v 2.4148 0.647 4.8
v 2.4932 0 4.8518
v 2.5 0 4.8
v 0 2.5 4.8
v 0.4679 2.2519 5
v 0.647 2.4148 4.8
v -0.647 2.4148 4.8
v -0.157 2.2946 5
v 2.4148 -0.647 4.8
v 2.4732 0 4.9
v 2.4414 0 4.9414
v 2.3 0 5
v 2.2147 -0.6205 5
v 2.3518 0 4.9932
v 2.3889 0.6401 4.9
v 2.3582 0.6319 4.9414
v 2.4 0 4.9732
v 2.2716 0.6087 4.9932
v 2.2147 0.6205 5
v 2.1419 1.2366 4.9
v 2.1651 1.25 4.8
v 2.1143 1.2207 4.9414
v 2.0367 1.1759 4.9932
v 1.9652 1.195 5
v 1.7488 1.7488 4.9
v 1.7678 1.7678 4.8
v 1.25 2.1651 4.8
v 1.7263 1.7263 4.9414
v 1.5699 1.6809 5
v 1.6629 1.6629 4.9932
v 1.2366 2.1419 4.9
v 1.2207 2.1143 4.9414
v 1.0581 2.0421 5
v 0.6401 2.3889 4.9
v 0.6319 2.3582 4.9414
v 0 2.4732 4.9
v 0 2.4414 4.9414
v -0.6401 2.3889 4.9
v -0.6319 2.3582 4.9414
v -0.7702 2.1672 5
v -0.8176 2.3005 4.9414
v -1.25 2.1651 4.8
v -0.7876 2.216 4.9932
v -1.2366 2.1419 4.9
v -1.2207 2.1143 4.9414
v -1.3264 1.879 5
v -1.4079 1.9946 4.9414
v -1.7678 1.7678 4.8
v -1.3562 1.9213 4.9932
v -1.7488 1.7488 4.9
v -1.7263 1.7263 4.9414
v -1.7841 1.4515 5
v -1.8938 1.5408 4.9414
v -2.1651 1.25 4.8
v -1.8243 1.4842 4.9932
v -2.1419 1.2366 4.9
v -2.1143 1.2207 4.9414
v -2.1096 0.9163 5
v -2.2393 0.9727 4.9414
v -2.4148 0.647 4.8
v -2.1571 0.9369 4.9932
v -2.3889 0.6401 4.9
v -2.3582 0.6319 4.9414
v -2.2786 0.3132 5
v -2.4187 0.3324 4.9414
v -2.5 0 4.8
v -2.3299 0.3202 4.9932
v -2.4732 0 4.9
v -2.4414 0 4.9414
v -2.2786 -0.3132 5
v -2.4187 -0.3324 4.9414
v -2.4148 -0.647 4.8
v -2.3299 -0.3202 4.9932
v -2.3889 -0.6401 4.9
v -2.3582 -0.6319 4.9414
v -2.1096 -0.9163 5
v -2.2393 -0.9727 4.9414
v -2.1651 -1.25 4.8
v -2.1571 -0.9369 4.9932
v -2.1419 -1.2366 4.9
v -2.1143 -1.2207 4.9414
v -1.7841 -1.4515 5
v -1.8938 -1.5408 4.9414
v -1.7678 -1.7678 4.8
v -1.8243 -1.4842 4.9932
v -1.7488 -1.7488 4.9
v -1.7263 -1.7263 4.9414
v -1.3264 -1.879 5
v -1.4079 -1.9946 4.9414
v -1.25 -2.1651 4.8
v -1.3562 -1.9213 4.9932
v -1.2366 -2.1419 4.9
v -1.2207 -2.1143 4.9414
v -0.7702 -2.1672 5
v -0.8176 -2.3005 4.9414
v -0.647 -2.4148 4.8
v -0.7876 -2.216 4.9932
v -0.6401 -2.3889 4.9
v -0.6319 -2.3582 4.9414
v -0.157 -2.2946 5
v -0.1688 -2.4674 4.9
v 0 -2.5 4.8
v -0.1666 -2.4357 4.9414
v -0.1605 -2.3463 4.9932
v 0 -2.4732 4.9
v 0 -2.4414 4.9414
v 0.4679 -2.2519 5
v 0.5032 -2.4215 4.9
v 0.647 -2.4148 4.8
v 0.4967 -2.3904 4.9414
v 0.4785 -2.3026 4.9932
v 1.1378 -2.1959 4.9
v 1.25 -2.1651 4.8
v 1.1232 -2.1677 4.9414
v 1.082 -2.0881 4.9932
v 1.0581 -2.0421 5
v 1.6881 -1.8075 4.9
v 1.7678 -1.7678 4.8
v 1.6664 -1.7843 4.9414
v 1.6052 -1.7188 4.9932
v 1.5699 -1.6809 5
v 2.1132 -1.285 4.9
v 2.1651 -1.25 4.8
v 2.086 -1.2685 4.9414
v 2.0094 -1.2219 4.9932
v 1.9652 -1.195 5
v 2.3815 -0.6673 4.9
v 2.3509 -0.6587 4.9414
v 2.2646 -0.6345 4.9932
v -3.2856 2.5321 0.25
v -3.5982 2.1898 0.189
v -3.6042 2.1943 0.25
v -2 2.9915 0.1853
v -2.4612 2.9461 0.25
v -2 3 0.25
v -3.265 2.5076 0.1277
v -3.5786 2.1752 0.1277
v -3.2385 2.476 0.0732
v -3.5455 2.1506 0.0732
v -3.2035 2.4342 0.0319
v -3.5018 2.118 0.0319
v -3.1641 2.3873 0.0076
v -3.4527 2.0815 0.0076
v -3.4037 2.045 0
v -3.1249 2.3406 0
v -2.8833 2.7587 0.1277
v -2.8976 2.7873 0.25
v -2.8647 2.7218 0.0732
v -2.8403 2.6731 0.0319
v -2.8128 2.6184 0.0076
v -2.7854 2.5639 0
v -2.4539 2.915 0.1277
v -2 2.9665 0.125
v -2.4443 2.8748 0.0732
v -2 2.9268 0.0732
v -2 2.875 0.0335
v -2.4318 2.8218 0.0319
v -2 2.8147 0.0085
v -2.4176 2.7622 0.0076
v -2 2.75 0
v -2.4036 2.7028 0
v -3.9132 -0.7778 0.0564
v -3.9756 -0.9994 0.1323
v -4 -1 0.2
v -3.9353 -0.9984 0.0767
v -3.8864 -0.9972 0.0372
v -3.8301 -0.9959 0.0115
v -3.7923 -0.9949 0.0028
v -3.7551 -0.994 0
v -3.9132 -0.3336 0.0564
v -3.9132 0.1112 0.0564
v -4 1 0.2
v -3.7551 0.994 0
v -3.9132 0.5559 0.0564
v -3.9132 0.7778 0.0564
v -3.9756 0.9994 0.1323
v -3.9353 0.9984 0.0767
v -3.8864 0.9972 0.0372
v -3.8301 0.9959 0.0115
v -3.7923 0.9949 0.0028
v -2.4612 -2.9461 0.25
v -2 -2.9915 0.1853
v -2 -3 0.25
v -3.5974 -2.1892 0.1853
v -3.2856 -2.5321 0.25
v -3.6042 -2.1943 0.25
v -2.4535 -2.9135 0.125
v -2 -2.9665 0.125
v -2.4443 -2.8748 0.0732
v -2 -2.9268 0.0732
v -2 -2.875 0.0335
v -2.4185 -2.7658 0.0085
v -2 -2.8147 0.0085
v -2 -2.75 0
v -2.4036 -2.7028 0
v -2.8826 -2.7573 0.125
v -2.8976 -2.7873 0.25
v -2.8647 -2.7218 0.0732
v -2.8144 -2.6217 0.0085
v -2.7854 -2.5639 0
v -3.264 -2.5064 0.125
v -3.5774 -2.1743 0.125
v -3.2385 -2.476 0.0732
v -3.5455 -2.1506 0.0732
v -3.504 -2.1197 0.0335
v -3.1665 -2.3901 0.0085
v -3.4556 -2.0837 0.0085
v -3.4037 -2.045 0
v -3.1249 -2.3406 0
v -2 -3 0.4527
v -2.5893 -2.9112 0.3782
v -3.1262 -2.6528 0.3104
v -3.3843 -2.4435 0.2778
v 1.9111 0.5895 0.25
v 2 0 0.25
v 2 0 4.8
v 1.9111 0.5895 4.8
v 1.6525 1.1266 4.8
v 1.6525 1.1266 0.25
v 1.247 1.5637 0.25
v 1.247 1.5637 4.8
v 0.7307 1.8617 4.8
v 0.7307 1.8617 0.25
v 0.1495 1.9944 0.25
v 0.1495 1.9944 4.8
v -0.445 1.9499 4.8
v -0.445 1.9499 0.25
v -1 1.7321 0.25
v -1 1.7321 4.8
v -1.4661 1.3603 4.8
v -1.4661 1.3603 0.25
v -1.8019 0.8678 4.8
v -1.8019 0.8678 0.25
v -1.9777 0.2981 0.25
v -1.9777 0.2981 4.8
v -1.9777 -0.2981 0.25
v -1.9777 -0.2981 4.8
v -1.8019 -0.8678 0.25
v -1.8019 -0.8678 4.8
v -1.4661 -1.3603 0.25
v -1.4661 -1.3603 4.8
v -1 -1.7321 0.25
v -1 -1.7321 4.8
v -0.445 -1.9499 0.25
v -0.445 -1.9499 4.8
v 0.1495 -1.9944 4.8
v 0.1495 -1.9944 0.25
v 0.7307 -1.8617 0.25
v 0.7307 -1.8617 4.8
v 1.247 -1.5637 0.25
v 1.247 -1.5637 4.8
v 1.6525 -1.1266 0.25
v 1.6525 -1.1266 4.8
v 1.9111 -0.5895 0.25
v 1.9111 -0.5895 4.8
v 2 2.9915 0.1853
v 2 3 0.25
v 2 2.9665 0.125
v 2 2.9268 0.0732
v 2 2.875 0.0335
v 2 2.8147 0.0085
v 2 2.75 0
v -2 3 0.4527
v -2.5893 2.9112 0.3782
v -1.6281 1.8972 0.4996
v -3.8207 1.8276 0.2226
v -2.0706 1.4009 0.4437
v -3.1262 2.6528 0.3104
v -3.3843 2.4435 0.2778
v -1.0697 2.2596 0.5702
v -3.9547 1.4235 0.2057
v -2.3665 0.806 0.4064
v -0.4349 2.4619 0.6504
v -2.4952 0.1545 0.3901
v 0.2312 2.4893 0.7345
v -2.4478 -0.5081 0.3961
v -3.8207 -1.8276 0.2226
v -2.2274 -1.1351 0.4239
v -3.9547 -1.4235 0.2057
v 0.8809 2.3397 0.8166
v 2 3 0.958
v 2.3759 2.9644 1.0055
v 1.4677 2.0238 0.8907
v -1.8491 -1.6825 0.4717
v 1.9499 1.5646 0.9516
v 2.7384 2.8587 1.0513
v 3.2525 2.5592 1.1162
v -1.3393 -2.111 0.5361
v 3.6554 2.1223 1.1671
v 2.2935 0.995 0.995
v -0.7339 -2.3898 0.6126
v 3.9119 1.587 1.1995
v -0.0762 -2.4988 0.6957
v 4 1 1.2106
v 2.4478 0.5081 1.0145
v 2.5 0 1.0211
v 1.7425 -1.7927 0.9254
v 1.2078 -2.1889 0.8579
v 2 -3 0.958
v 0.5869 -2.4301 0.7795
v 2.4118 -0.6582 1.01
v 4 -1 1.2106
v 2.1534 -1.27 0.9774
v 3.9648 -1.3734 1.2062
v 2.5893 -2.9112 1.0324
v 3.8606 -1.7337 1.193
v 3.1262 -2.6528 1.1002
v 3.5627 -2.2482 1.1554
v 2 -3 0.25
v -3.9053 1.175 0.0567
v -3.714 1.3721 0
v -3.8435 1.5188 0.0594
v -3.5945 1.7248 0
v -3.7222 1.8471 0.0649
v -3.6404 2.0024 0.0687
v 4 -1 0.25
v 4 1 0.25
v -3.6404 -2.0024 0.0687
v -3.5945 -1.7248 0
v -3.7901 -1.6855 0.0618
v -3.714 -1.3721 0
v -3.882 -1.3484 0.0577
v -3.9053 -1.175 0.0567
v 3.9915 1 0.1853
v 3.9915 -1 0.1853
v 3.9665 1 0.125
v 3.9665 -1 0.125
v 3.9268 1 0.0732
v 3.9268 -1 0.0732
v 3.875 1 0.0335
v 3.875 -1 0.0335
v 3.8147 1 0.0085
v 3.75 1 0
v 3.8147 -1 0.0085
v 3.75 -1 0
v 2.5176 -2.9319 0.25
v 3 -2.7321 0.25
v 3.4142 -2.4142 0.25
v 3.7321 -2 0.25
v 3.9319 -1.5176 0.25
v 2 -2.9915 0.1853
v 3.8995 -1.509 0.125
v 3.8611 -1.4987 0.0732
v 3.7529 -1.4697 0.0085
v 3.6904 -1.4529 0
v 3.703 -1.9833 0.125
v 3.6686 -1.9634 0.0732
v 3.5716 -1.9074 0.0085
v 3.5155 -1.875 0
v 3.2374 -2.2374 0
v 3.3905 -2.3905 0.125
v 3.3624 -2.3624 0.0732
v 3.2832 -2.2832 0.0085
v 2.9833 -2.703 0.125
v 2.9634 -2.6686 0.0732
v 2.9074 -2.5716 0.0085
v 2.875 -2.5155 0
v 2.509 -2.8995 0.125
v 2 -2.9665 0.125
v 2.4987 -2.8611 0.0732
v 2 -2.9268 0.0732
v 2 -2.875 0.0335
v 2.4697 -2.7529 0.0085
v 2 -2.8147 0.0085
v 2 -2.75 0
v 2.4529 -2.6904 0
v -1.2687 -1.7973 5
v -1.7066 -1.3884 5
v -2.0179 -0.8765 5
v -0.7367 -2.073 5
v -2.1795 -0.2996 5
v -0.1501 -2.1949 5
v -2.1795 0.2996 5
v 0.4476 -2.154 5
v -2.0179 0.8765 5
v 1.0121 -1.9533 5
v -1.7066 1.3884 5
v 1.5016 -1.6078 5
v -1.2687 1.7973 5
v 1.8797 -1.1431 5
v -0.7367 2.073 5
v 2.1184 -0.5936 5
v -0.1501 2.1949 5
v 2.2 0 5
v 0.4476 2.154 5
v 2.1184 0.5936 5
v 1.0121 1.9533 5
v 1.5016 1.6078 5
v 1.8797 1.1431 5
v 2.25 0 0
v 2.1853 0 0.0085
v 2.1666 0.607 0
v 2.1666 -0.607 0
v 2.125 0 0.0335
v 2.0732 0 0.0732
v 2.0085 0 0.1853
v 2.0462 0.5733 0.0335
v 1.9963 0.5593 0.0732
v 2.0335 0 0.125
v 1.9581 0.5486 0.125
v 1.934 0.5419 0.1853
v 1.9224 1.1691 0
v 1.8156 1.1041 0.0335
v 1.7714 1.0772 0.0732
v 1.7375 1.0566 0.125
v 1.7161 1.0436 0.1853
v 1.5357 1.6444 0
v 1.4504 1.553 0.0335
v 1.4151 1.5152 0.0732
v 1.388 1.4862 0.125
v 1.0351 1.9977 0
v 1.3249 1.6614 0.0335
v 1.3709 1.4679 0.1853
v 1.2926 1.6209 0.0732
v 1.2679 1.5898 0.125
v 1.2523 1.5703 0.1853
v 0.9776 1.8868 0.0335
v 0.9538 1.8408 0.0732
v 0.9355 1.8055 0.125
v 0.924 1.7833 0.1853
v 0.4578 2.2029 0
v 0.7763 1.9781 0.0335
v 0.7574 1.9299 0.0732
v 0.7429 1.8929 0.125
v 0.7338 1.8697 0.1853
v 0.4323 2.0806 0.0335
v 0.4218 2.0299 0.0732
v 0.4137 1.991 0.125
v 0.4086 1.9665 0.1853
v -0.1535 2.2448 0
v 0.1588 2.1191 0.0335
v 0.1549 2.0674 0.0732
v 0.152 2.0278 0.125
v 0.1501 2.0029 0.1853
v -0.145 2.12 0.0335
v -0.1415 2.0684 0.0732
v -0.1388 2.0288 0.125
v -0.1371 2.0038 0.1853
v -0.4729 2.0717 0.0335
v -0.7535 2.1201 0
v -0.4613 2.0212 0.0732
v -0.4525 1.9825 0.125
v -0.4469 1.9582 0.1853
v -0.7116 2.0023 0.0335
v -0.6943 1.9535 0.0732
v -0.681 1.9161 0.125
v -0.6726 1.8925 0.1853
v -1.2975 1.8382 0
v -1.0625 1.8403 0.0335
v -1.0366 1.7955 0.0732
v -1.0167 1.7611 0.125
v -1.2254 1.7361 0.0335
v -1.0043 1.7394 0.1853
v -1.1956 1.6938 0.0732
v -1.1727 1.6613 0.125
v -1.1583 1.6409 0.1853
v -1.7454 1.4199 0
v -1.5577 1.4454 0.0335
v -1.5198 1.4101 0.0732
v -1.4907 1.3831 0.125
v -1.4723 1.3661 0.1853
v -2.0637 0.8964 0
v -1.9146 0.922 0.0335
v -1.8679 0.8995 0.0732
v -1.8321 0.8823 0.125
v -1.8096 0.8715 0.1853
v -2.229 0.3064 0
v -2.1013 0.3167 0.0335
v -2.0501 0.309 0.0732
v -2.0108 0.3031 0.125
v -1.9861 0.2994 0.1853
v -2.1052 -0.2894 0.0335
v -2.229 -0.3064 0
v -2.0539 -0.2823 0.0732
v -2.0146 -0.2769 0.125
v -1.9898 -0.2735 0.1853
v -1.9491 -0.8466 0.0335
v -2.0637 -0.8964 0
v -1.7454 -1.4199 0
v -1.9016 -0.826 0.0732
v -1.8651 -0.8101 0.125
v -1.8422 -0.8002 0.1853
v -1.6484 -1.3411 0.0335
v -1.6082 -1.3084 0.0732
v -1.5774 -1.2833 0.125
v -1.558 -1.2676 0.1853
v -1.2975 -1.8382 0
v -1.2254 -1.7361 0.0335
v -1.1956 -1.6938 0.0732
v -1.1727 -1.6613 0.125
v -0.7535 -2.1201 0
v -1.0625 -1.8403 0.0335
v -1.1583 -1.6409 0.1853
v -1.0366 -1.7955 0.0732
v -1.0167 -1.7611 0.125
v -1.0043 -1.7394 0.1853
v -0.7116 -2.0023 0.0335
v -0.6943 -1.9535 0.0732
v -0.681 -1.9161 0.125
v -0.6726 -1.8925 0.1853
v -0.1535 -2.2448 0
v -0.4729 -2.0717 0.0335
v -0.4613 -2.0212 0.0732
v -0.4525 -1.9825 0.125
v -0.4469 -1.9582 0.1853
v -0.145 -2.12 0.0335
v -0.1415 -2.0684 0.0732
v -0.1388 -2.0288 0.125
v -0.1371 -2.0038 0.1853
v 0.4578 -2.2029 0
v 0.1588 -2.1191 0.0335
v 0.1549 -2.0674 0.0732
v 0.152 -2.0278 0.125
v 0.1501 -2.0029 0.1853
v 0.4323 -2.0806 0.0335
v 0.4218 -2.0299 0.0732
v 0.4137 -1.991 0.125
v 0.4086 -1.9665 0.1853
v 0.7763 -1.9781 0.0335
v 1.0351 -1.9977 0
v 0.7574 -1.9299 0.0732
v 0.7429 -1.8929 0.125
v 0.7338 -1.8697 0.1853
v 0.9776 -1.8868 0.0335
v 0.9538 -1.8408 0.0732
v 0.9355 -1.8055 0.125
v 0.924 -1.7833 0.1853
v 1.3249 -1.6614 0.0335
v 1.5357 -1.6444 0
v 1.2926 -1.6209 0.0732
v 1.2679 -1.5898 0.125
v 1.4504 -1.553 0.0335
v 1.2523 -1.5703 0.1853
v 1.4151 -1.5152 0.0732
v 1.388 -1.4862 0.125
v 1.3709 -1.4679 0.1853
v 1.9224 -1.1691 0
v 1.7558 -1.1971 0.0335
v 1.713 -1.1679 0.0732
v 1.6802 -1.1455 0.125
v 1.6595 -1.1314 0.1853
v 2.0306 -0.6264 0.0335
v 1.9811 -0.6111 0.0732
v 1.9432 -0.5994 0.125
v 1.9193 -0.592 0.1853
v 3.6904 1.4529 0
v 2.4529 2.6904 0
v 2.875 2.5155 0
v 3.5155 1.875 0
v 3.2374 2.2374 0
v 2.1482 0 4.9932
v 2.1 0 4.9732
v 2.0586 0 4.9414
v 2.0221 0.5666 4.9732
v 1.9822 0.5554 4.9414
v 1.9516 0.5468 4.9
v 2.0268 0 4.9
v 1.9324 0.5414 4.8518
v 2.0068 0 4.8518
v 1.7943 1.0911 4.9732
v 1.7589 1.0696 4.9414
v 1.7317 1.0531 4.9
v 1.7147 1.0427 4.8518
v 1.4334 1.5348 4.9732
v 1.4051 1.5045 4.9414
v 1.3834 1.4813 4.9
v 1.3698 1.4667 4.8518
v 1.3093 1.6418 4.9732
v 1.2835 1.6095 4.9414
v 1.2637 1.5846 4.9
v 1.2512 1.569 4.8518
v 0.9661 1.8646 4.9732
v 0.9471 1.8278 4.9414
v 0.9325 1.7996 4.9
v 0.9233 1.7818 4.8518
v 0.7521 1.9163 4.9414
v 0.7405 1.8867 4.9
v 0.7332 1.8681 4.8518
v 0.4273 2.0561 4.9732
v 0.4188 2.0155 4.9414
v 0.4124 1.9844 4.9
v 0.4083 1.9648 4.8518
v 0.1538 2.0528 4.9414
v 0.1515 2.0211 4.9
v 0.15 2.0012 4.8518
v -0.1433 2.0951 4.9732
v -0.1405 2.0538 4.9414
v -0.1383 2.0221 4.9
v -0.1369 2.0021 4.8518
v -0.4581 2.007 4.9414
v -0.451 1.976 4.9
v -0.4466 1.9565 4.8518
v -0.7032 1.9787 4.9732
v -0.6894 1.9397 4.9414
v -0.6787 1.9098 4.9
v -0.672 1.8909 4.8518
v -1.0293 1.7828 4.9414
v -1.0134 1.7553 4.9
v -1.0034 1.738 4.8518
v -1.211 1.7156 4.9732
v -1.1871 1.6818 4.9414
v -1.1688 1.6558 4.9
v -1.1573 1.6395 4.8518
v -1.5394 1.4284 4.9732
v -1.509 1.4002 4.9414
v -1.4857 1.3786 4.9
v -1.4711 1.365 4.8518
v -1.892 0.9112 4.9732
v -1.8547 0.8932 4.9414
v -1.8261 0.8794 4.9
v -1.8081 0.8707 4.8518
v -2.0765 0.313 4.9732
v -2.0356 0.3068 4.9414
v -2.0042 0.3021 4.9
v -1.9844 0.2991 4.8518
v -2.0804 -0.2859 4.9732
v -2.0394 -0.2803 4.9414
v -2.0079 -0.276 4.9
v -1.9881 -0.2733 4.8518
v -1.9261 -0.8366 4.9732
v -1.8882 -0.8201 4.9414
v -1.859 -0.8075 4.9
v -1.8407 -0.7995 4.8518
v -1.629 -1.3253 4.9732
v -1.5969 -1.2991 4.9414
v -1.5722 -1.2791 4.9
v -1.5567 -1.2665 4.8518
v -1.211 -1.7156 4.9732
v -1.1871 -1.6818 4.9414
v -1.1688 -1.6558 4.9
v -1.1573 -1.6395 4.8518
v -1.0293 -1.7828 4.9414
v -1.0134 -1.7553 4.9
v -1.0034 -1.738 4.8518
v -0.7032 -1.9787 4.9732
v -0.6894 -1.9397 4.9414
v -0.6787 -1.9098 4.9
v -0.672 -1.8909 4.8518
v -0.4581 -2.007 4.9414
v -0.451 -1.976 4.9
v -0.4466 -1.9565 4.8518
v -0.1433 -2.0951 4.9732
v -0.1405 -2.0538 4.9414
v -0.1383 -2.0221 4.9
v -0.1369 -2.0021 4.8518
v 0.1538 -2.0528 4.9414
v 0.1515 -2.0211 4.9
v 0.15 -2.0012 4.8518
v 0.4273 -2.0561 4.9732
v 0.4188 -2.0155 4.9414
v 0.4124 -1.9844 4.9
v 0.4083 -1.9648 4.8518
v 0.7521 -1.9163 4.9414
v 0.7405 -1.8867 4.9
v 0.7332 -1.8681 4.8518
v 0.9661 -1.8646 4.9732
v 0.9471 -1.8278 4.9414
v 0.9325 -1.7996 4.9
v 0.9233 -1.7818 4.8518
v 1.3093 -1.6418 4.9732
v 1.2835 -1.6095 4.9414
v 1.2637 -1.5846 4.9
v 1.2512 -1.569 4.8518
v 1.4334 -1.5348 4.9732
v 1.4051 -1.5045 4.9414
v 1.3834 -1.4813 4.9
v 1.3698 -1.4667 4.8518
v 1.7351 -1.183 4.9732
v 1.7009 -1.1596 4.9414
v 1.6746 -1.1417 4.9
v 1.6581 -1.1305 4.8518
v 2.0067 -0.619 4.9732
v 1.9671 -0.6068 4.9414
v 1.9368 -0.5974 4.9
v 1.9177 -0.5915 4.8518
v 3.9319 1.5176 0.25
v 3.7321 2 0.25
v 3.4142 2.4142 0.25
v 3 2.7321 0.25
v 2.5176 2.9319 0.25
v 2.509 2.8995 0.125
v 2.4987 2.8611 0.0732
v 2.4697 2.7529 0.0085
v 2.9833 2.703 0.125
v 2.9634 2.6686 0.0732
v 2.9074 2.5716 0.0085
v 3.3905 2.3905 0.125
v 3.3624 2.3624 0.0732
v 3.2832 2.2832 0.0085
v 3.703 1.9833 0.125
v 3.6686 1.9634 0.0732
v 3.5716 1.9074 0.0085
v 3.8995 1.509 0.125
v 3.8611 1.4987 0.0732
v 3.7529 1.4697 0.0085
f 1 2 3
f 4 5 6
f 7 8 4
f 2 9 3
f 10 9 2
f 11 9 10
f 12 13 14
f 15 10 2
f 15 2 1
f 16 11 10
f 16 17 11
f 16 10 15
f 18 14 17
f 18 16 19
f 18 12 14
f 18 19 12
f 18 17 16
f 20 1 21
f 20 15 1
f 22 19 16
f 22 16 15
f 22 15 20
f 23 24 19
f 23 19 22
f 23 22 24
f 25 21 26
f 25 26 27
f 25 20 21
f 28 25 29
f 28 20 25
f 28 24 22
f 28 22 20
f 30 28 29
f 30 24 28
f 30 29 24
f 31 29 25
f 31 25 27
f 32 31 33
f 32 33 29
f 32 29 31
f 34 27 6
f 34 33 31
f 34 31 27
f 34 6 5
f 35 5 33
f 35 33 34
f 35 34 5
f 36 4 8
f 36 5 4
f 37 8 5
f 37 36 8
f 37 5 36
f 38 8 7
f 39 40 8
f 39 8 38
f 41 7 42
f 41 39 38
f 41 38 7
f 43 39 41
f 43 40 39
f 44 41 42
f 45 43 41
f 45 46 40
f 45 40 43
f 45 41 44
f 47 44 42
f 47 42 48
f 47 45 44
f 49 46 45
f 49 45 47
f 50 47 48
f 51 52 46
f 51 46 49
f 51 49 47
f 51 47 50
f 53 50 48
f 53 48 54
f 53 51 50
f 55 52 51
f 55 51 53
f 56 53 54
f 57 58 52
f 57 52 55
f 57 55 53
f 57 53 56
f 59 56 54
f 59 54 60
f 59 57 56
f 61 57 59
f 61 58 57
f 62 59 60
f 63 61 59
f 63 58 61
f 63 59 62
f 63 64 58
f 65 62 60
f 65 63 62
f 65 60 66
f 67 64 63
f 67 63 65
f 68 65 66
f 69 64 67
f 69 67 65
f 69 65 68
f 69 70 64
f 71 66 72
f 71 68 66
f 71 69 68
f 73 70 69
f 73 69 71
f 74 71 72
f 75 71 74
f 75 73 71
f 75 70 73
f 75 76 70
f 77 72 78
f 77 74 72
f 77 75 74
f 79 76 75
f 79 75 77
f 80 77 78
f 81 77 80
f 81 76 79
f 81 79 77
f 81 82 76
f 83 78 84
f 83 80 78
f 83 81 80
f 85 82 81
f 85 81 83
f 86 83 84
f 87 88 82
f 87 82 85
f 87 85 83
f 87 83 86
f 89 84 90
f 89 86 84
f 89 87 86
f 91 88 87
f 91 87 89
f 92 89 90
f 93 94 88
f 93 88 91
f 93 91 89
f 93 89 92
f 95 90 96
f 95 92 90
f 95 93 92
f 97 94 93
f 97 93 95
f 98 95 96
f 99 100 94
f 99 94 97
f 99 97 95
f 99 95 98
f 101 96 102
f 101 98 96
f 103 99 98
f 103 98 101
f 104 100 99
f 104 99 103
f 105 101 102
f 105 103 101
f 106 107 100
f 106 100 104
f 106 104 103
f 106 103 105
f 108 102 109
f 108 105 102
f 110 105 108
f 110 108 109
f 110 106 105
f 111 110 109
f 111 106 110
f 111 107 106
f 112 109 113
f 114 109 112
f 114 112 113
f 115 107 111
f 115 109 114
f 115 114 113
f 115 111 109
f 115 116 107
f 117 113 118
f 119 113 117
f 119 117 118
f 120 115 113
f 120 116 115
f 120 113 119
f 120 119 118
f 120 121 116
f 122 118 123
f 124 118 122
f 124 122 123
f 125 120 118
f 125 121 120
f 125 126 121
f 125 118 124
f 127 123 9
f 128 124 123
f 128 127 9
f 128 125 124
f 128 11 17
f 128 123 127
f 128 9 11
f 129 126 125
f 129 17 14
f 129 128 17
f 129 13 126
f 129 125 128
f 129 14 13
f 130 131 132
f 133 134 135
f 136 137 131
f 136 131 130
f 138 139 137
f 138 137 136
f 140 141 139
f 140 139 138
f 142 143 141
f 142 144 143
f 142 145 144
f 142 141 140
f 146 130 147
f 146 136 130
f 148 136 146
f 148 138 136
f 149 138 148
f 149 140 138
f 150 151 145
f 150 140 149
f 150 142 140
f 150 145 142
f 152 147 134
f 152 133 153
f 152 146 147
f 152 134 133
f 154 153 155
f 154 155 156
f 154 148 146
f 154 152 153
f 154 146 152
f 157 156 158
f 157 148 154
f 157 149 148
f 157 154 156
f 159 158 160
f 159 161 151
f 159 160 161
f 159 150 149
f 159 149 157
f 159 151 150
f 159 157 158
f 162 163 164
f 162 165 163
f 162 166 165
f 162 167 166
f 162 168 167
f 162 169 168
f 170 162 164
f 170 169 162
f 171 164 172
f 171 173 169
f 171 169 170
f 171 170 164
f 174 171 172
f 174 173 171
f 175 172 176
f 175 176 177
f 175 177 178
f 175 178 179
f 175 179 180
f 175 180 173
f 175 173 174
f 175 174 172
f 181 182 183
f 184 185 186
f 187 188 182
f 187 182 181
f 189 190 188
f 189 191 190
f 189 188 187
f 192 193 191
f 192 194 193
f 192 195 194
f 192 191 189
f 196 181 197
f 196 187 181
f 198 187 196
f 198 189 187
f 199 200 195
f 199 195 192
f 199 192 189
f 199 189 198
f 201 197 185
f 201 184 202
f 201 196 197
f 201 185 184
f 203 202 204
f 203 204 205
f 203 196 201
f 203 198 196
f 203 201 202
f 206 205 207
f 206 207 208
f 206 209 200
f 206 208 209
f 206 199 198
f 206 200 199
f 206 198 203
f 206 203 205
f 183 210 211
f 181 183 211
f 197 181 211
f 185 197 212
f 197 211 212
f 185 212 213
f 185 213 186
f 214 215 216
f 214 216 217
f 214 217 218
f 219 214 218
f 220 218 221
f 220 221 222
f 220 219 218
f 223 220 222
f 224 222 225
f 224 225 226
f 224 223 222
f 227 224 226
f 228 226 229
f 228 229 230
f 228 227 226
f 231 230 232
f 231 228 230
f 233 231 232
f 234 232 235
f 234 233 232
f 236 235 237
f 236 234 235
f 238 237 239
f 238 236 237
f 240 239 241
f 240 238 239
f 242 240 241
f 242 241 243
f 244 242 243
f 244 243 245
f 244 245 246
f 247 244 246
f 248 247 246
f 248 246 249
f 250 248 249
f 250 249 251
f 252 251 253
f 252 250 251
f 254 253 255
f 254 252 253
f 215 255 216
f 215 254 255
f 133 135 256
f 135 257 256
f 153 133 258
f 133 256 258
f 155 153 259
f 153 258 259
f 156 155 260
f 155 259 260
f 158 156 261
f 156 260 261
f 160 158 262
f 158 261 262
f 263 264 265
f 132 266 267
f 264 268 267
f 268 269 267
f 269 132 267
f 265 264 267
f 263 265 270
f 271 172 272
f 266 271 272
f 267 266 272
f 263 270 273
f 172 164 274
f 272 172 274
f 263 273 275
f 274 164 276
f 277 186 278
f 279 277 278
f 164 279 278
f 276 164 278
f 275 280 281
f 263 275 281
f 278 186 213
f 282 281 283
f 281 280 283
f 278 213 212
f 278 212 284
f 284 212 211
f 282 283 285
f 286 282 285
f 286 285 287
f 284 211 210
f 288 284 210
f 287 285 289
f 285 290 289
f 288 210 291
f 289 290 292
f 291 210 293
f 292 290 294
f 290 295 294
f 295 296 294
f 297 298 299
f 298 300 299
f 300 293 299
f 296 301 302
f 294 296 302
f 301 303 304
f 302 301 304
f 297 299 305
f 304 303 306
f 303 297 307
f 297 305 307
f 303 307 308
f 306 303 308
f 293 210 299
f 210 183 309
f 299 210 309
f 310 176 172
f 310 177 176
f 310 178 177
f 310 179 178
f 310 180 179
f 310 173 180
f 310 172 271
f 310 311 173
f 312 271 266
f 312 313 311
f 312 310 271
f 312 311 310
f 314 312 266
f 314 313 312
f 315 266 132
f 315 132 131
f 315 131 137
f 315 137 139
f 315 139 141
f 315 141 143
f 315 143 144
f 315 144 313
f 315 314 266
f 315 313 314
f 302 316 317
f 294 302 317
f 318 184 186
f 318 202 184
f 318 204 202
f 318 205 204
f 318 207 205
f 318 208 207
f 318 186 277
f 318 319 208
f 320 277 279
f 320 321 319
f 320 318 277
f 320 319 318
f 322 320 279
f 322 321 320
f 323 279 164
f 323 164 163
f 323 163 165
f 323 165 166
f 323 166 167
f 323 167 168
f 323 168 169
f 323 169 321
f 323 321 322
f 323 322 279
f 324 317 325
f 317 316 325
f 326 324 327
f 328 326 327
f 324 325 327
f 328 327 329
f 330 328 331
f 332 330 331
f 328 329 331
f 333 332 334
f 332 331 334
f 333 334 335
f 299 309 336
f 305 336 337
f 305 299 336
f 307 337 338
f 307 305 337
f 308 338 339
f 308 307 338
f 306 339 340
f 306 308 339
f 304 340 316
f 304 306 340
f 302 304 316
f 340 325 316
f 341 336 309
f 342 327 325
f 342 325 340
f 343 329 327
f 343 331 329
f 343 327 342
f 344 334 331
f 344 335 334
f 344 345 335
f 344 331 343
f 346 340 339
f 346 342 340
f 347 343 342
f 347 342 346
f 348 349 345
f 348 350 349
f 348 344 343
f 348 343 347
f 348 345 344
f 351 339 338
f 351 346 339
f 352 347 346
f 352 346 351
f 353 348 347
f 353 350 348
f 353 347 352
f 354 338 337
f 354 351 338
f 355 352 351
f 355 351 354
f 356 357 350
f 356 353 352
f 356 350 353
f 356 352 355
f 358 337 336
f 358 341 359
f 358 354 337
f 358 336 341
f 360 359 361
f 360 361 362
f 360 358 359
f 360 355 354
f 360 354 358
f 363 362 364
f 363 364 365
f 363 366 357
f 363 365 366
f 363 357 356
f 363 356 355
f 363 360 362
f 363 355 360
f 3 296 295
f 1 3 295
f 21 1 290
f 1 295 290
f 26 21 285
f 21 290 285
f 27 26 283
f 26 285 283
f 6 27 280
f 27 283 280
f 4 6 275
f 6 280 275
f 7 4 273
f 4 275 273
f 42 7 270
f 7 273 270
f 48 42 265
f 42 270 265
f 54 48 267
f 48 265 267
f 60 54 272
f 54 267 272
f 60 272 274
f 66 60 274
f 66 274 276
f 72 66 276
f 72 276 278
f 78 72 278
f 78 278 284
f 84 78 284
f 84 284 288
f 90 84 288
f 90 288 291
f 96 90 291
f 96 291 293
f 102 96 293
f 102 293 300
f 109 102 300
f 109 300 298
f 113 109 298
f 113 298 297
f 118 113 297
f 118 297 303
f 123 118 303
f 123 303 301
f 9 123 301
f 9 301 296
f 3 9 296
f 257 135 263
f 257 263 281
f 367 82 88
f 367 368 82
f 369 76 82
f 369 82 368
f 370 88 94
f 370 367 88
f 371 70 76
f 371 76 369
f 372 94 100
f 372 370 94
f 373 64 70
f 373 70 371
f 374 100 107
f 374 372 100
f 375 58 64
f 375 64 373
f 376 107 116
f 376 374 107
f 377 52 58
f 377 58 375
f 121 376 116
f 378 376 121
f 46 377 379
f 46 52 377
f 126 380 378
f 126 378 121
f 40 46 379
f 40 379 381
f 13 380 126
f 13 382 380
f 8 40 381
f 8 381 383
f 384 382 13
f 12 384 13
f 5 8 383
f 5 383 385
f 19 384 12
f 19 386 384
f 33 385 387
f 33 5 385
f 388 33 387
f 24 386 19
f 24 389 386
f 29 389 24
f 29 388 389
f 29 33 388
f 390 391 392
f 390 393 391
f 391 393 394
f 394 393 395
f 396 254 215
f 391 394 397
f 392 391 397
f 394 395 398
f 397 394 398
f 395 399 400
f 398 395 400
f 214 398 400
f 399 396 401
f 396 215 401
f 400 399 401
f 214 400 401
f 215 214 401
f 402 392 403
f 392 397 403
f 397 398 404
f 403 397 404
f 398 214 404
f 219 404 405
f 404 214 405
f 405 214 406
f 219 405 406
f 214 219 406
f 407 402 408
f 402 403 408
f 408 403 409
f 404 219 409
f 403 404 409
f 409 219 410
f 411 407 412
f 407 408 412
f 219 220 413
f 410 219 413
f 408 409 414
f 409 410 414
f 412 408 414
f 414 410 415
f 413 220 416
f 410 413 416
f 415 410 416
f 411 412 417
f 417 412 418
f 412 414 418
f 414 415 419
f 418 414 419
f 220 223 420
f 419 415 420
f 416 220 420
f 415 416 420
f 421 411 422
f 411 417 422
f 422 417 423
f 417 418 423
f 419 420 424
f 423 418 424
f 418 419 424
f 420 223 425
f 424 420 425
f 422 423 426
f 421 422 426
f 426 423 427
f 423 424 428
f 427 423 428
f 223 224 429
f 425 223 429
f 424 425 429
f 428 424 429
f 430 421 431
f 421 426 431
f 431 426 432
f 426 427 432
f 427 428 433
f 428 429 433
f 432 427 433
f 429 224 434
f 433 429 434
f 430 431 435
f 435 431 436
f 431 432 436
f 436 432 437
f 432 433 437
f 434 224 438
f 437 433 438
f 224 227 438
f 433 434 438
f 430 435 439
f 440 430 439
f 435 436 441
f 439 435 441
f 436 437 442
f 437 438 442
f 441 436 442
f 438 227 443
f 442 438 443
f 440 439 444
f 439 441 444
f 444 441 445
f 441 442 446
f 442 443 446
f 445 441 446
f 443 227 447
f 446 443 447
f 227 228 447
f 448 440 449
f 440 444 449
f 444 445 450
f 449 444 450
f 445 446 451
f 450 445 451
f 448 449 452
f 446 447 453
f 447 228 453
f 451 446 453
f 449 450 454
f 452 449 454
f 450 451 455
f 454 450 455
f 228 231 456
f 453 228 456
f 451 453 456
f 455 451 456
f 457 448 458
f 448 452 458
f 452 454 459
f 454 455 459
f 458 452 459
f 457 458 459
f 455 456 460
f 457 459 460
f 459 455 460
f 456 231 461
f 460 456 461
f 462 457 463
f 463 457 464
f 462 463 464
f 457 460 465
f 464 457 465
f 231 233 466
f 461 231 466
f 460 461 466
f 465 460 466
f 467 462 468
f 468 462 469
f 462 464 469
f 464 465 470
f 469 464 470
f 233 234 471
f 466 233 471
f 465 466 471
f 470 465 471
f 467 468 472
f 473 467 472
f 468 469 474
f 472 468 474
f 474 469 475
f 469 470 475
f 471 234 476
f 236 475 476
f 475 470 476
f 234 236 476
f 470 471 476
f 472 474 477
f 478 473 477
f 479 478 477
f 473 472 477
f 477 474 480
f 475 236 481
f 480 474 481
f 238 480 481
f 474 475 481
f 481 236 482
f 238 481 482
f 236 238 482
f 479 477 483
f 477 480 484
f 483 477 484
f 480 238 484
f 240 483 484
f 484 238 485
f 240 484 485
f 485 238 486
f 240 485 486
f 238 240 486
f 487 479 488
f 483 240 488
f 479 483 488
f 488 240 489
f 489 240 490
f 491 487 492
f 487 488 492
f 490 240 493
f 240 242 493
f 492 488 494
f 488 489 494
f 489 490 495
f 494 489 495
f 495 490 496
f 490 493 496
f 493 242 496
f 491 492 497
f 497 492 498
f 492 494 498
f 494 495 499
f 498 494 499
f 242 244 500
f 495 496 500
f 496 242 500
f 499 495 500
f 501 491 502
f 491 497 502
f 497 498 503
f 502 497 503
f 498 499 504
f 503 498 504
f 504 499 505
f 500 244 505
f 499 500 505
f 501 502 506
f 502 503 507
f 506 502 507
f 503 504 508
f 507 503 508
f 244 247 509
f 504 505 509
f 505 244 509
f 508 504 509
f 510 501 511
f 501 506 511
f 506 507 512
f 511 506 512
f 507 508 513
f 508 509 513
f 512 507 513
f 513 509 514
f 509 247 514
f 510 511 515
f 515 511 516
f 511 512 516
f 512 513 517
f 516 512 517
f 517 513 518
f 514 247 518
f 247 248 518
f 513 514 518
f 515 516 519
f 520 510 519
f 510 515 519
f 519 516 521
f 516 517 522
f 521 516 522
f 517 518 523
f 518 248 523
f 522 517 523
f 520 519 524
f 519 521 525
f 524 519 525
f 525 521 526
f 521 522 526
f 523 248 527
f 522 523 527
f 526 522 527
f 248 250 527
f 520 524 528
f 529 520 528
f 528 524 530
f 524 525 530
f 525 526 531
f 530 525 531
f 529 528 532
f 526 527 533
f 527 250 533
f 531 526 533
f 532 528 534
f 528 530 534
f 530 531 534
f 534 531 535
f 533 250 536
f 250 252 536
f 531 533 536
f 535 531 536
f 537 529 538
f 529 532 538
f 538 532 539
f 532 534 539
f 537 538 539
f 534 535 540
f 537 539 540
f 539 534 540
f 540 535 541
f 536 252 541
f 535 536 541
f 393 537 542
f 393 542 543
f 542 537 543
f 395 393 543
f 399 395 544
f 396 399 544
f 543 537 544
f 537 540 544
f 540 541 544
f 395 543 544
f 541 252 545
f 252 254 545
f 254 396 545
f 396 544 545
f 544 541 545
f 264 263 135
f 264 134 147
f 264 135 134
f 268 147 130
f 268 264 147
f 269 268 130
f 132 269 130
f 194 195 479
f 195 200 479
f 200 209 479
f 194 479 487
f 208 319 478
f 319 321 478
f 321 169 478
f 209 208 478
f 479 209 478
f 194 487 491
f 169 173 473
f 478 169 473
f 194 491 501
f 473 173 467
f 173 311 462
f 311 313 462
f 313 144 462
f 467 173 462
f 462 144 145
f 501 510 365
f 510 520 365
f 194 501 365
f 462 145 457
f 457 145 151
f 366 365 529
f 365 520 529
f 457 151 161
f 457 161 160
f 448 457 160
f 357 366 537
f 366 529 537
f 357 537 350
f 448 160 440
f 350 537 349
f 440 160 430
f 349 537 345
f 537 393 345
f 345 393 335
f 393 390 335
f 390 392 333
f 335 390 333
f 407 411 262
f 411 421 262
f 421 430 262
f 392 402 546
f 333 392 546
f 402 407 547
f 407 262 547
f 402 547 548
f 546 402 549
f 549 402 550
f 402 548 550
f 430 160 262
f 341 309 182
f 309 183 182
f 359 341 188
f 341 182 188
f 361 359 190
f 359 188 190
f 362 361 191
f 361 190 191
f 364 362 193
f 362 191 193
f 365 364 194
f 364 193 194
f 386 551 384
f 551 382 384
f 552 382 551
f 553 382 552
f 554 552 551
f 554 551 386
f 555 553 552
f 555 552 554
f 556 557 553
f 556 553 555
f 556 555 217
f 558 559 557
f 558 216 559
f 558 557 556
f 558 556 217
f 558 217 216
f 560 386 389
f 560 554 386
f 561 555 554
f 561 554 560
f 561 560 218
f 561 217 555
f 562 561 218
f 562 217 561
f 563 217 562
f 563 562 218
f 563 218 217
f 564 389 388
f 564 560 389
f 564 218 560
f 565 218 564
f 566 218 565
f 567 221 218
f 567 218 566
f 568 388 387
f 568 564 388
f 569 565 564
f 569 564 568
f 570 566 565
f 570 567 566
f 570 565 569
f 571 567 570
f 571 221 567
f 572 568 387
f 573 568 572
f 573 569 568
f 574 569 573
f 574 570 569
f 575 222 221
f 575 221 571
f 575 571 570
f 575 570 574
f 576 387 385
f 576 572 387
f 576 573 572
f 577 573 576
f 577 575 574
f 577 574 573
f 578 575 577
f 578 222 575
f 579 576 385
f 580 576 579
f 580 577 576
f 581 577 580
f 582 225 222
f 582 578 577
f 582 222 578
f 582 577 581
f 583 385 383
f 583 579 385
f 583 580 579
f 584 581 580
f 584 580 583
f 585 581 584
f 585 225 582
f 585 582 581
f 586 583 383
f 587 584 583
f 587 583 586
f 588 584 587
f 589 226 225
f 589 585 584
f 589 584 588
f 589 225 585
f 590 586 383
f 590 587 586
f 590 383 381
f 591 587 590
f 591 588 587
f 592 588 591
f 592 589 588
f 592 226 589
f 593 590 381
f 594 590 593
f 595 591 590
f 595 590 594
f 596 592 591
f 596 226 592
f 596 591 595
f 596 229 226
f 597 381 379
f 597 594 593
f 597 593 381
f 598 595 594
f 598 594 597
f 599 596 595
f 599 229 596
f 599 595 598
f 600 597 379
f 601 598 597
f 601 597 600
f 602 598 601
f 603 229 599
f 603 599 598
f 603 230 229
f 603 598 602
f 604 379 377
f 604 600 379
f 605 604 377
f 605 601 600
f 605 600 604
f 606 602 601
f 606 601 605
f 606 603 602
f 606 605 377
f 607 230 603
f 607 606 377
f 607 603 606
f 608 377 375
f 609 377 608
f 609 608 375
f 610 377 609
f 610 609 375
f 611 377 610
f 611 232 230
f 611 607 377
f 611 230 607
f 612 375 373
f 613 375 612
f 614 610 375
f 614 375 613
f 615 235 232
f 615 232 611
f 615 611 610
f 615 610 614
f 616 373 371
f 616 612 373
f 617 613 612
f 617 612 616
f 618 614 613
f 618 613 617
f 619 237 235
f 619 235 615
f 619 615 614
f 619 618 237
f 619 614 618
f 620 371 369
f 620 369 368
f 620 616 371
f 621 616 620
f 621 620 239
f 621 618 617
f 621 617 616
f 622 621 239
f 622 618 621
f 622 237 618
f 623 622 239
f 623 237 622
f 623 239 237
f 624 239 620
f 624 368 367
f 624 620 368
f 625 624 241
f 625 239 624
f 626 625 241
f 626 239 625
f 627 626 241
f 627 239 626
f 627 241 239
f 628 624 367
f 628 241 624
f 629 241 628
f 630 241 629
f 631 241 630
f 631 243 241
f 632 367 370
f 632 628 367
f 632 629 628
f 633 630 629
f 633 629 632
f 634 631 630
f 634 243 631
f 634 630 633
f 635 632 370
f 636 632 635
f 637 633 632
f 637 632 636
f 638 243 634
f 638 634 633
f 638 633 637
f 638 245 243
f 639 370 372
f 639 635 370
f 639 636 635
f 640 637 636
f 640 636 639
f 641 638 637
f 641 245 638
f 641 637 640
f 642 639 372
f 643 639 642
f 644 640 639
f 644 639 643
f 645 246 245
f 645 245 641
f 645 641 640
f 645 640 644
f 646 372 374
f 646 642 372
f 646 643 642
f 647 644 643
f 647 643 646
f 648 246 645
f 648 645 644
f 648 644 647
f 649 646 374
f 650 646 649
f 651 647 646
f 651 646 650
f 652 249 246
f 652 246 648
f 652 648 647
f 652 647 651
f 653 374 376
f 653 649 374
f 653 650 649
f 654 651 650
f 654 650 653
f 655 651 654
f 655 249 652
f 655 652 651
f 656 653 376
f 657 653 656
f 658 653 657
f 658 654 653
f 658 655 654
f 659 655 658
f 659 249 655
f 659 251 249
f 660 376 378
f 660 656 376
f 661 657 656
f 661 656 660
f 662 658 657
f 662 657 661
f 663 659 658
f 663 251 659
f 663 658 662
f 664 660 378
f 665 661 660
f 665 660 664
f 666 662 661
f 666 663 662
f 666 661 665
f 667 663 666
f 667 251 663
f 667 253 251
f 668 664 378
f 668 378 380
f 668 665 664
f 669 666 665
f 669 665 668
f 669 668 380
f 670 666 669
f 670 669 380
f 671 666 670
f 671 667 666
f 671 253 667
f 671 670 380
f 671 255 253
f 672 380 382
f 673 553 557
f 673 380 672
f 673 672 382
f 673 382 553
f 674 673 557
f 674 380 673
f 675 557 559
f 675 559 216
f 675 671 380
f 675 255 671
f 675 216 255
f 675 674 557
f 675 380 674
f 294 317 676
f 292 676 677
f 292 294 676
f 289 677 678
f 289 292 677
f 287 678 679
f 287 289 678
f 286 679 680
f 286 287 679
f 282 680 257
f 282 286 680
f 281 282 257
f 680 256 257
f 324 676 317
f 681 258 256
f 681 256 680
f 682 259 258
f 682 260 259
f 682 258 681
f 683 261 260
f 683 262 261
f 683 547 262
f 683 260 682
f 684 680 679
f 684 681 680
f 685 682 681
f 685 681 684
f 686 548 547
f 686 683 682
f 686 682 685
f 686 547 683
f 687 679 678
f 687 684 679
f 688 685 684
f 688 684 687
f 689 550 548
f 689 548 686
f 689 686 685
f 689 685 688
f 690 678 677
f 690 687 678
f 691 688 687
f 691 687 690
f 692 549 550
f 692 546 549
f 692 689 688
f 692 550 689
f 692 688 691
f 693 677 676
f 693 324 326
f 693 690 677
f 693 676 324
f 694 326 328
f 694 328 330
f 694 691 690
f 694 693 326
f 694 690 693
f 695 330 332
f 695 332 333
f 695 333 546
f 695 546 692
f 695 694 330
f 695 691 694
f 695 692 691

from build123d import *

# Parameters (mm, degrees)
F0_W     = 8
F0_H     = 6
F0_R     = 2.5
F1_DEPTH = 5
F3_DEPTH = 25
F0_R_2   = 2
F4_DEPTH = 5
F5_R     = 2
F6_R     = 0.25
F7_R     = 0.2


with BuildPart() as f1:
    # F0 (on Top) → F1 (new body)
    with BuildSketch(Plane.XY):
        Rectangle(F0_W, F0_H)
        Circle(F0_R, mode=Mode.SUBTRACT)
    extrude(amount=F1_DEPTH)

    # F2 (on face) → F3 (cut)
    with BuildSketch(Plane.XZ.offset(3)):
        Polygon((-4, 5), (-4, 0.2), (4, 1.210635), (4, 5), align=None)
    extrude(amount=-F3_DEPTH, mode=Mode.SUBTRACT)

    # F0 (on Top) → F4 (join)
    with BuildSketch(Plane.XY):
        Circle(F0_R)
        Circle(F0_R_2, mode=Mode.SUBTRACT)
    extrude(amount=F4_DEPTH)

    # F5
    f5_edges = [f1.edges().sort_by_distance(p)[0] for p in [
        (4, 3, 0.605318),
        (-4, 3, 0.1),
        (-4, -3, 0.1),
        (4, -3, 0.605318),
    ]]
    fillet(f5_edges, radius=F5_R)

    # F6
    f6_edges = [f1.edges().sort_by_distance(p)[0] for p in [
        (0, 3, 0),
        (3.414214, 2.414214, 0),
        (-3.414214, 2.414214, 0),
        (4, 0, 0),
        (-4, 0, 0),
        (3.414214, -2.414214, 0),
        (-3.414214, -2.414214, 0),
        (0, -3, 0),
        (-2, 0, 0),
    ]]
    fillet(f6_edges, radius=F6_R)

    # F7
    f7_edges = [f1.edges().sort_by_distance(p)[0] for p in [
        (-2, 0, 5),
        (-2.5, 0, 5),
    ]]
    fillet(f7_edges, radius=F7_R)


solid = f1.part
